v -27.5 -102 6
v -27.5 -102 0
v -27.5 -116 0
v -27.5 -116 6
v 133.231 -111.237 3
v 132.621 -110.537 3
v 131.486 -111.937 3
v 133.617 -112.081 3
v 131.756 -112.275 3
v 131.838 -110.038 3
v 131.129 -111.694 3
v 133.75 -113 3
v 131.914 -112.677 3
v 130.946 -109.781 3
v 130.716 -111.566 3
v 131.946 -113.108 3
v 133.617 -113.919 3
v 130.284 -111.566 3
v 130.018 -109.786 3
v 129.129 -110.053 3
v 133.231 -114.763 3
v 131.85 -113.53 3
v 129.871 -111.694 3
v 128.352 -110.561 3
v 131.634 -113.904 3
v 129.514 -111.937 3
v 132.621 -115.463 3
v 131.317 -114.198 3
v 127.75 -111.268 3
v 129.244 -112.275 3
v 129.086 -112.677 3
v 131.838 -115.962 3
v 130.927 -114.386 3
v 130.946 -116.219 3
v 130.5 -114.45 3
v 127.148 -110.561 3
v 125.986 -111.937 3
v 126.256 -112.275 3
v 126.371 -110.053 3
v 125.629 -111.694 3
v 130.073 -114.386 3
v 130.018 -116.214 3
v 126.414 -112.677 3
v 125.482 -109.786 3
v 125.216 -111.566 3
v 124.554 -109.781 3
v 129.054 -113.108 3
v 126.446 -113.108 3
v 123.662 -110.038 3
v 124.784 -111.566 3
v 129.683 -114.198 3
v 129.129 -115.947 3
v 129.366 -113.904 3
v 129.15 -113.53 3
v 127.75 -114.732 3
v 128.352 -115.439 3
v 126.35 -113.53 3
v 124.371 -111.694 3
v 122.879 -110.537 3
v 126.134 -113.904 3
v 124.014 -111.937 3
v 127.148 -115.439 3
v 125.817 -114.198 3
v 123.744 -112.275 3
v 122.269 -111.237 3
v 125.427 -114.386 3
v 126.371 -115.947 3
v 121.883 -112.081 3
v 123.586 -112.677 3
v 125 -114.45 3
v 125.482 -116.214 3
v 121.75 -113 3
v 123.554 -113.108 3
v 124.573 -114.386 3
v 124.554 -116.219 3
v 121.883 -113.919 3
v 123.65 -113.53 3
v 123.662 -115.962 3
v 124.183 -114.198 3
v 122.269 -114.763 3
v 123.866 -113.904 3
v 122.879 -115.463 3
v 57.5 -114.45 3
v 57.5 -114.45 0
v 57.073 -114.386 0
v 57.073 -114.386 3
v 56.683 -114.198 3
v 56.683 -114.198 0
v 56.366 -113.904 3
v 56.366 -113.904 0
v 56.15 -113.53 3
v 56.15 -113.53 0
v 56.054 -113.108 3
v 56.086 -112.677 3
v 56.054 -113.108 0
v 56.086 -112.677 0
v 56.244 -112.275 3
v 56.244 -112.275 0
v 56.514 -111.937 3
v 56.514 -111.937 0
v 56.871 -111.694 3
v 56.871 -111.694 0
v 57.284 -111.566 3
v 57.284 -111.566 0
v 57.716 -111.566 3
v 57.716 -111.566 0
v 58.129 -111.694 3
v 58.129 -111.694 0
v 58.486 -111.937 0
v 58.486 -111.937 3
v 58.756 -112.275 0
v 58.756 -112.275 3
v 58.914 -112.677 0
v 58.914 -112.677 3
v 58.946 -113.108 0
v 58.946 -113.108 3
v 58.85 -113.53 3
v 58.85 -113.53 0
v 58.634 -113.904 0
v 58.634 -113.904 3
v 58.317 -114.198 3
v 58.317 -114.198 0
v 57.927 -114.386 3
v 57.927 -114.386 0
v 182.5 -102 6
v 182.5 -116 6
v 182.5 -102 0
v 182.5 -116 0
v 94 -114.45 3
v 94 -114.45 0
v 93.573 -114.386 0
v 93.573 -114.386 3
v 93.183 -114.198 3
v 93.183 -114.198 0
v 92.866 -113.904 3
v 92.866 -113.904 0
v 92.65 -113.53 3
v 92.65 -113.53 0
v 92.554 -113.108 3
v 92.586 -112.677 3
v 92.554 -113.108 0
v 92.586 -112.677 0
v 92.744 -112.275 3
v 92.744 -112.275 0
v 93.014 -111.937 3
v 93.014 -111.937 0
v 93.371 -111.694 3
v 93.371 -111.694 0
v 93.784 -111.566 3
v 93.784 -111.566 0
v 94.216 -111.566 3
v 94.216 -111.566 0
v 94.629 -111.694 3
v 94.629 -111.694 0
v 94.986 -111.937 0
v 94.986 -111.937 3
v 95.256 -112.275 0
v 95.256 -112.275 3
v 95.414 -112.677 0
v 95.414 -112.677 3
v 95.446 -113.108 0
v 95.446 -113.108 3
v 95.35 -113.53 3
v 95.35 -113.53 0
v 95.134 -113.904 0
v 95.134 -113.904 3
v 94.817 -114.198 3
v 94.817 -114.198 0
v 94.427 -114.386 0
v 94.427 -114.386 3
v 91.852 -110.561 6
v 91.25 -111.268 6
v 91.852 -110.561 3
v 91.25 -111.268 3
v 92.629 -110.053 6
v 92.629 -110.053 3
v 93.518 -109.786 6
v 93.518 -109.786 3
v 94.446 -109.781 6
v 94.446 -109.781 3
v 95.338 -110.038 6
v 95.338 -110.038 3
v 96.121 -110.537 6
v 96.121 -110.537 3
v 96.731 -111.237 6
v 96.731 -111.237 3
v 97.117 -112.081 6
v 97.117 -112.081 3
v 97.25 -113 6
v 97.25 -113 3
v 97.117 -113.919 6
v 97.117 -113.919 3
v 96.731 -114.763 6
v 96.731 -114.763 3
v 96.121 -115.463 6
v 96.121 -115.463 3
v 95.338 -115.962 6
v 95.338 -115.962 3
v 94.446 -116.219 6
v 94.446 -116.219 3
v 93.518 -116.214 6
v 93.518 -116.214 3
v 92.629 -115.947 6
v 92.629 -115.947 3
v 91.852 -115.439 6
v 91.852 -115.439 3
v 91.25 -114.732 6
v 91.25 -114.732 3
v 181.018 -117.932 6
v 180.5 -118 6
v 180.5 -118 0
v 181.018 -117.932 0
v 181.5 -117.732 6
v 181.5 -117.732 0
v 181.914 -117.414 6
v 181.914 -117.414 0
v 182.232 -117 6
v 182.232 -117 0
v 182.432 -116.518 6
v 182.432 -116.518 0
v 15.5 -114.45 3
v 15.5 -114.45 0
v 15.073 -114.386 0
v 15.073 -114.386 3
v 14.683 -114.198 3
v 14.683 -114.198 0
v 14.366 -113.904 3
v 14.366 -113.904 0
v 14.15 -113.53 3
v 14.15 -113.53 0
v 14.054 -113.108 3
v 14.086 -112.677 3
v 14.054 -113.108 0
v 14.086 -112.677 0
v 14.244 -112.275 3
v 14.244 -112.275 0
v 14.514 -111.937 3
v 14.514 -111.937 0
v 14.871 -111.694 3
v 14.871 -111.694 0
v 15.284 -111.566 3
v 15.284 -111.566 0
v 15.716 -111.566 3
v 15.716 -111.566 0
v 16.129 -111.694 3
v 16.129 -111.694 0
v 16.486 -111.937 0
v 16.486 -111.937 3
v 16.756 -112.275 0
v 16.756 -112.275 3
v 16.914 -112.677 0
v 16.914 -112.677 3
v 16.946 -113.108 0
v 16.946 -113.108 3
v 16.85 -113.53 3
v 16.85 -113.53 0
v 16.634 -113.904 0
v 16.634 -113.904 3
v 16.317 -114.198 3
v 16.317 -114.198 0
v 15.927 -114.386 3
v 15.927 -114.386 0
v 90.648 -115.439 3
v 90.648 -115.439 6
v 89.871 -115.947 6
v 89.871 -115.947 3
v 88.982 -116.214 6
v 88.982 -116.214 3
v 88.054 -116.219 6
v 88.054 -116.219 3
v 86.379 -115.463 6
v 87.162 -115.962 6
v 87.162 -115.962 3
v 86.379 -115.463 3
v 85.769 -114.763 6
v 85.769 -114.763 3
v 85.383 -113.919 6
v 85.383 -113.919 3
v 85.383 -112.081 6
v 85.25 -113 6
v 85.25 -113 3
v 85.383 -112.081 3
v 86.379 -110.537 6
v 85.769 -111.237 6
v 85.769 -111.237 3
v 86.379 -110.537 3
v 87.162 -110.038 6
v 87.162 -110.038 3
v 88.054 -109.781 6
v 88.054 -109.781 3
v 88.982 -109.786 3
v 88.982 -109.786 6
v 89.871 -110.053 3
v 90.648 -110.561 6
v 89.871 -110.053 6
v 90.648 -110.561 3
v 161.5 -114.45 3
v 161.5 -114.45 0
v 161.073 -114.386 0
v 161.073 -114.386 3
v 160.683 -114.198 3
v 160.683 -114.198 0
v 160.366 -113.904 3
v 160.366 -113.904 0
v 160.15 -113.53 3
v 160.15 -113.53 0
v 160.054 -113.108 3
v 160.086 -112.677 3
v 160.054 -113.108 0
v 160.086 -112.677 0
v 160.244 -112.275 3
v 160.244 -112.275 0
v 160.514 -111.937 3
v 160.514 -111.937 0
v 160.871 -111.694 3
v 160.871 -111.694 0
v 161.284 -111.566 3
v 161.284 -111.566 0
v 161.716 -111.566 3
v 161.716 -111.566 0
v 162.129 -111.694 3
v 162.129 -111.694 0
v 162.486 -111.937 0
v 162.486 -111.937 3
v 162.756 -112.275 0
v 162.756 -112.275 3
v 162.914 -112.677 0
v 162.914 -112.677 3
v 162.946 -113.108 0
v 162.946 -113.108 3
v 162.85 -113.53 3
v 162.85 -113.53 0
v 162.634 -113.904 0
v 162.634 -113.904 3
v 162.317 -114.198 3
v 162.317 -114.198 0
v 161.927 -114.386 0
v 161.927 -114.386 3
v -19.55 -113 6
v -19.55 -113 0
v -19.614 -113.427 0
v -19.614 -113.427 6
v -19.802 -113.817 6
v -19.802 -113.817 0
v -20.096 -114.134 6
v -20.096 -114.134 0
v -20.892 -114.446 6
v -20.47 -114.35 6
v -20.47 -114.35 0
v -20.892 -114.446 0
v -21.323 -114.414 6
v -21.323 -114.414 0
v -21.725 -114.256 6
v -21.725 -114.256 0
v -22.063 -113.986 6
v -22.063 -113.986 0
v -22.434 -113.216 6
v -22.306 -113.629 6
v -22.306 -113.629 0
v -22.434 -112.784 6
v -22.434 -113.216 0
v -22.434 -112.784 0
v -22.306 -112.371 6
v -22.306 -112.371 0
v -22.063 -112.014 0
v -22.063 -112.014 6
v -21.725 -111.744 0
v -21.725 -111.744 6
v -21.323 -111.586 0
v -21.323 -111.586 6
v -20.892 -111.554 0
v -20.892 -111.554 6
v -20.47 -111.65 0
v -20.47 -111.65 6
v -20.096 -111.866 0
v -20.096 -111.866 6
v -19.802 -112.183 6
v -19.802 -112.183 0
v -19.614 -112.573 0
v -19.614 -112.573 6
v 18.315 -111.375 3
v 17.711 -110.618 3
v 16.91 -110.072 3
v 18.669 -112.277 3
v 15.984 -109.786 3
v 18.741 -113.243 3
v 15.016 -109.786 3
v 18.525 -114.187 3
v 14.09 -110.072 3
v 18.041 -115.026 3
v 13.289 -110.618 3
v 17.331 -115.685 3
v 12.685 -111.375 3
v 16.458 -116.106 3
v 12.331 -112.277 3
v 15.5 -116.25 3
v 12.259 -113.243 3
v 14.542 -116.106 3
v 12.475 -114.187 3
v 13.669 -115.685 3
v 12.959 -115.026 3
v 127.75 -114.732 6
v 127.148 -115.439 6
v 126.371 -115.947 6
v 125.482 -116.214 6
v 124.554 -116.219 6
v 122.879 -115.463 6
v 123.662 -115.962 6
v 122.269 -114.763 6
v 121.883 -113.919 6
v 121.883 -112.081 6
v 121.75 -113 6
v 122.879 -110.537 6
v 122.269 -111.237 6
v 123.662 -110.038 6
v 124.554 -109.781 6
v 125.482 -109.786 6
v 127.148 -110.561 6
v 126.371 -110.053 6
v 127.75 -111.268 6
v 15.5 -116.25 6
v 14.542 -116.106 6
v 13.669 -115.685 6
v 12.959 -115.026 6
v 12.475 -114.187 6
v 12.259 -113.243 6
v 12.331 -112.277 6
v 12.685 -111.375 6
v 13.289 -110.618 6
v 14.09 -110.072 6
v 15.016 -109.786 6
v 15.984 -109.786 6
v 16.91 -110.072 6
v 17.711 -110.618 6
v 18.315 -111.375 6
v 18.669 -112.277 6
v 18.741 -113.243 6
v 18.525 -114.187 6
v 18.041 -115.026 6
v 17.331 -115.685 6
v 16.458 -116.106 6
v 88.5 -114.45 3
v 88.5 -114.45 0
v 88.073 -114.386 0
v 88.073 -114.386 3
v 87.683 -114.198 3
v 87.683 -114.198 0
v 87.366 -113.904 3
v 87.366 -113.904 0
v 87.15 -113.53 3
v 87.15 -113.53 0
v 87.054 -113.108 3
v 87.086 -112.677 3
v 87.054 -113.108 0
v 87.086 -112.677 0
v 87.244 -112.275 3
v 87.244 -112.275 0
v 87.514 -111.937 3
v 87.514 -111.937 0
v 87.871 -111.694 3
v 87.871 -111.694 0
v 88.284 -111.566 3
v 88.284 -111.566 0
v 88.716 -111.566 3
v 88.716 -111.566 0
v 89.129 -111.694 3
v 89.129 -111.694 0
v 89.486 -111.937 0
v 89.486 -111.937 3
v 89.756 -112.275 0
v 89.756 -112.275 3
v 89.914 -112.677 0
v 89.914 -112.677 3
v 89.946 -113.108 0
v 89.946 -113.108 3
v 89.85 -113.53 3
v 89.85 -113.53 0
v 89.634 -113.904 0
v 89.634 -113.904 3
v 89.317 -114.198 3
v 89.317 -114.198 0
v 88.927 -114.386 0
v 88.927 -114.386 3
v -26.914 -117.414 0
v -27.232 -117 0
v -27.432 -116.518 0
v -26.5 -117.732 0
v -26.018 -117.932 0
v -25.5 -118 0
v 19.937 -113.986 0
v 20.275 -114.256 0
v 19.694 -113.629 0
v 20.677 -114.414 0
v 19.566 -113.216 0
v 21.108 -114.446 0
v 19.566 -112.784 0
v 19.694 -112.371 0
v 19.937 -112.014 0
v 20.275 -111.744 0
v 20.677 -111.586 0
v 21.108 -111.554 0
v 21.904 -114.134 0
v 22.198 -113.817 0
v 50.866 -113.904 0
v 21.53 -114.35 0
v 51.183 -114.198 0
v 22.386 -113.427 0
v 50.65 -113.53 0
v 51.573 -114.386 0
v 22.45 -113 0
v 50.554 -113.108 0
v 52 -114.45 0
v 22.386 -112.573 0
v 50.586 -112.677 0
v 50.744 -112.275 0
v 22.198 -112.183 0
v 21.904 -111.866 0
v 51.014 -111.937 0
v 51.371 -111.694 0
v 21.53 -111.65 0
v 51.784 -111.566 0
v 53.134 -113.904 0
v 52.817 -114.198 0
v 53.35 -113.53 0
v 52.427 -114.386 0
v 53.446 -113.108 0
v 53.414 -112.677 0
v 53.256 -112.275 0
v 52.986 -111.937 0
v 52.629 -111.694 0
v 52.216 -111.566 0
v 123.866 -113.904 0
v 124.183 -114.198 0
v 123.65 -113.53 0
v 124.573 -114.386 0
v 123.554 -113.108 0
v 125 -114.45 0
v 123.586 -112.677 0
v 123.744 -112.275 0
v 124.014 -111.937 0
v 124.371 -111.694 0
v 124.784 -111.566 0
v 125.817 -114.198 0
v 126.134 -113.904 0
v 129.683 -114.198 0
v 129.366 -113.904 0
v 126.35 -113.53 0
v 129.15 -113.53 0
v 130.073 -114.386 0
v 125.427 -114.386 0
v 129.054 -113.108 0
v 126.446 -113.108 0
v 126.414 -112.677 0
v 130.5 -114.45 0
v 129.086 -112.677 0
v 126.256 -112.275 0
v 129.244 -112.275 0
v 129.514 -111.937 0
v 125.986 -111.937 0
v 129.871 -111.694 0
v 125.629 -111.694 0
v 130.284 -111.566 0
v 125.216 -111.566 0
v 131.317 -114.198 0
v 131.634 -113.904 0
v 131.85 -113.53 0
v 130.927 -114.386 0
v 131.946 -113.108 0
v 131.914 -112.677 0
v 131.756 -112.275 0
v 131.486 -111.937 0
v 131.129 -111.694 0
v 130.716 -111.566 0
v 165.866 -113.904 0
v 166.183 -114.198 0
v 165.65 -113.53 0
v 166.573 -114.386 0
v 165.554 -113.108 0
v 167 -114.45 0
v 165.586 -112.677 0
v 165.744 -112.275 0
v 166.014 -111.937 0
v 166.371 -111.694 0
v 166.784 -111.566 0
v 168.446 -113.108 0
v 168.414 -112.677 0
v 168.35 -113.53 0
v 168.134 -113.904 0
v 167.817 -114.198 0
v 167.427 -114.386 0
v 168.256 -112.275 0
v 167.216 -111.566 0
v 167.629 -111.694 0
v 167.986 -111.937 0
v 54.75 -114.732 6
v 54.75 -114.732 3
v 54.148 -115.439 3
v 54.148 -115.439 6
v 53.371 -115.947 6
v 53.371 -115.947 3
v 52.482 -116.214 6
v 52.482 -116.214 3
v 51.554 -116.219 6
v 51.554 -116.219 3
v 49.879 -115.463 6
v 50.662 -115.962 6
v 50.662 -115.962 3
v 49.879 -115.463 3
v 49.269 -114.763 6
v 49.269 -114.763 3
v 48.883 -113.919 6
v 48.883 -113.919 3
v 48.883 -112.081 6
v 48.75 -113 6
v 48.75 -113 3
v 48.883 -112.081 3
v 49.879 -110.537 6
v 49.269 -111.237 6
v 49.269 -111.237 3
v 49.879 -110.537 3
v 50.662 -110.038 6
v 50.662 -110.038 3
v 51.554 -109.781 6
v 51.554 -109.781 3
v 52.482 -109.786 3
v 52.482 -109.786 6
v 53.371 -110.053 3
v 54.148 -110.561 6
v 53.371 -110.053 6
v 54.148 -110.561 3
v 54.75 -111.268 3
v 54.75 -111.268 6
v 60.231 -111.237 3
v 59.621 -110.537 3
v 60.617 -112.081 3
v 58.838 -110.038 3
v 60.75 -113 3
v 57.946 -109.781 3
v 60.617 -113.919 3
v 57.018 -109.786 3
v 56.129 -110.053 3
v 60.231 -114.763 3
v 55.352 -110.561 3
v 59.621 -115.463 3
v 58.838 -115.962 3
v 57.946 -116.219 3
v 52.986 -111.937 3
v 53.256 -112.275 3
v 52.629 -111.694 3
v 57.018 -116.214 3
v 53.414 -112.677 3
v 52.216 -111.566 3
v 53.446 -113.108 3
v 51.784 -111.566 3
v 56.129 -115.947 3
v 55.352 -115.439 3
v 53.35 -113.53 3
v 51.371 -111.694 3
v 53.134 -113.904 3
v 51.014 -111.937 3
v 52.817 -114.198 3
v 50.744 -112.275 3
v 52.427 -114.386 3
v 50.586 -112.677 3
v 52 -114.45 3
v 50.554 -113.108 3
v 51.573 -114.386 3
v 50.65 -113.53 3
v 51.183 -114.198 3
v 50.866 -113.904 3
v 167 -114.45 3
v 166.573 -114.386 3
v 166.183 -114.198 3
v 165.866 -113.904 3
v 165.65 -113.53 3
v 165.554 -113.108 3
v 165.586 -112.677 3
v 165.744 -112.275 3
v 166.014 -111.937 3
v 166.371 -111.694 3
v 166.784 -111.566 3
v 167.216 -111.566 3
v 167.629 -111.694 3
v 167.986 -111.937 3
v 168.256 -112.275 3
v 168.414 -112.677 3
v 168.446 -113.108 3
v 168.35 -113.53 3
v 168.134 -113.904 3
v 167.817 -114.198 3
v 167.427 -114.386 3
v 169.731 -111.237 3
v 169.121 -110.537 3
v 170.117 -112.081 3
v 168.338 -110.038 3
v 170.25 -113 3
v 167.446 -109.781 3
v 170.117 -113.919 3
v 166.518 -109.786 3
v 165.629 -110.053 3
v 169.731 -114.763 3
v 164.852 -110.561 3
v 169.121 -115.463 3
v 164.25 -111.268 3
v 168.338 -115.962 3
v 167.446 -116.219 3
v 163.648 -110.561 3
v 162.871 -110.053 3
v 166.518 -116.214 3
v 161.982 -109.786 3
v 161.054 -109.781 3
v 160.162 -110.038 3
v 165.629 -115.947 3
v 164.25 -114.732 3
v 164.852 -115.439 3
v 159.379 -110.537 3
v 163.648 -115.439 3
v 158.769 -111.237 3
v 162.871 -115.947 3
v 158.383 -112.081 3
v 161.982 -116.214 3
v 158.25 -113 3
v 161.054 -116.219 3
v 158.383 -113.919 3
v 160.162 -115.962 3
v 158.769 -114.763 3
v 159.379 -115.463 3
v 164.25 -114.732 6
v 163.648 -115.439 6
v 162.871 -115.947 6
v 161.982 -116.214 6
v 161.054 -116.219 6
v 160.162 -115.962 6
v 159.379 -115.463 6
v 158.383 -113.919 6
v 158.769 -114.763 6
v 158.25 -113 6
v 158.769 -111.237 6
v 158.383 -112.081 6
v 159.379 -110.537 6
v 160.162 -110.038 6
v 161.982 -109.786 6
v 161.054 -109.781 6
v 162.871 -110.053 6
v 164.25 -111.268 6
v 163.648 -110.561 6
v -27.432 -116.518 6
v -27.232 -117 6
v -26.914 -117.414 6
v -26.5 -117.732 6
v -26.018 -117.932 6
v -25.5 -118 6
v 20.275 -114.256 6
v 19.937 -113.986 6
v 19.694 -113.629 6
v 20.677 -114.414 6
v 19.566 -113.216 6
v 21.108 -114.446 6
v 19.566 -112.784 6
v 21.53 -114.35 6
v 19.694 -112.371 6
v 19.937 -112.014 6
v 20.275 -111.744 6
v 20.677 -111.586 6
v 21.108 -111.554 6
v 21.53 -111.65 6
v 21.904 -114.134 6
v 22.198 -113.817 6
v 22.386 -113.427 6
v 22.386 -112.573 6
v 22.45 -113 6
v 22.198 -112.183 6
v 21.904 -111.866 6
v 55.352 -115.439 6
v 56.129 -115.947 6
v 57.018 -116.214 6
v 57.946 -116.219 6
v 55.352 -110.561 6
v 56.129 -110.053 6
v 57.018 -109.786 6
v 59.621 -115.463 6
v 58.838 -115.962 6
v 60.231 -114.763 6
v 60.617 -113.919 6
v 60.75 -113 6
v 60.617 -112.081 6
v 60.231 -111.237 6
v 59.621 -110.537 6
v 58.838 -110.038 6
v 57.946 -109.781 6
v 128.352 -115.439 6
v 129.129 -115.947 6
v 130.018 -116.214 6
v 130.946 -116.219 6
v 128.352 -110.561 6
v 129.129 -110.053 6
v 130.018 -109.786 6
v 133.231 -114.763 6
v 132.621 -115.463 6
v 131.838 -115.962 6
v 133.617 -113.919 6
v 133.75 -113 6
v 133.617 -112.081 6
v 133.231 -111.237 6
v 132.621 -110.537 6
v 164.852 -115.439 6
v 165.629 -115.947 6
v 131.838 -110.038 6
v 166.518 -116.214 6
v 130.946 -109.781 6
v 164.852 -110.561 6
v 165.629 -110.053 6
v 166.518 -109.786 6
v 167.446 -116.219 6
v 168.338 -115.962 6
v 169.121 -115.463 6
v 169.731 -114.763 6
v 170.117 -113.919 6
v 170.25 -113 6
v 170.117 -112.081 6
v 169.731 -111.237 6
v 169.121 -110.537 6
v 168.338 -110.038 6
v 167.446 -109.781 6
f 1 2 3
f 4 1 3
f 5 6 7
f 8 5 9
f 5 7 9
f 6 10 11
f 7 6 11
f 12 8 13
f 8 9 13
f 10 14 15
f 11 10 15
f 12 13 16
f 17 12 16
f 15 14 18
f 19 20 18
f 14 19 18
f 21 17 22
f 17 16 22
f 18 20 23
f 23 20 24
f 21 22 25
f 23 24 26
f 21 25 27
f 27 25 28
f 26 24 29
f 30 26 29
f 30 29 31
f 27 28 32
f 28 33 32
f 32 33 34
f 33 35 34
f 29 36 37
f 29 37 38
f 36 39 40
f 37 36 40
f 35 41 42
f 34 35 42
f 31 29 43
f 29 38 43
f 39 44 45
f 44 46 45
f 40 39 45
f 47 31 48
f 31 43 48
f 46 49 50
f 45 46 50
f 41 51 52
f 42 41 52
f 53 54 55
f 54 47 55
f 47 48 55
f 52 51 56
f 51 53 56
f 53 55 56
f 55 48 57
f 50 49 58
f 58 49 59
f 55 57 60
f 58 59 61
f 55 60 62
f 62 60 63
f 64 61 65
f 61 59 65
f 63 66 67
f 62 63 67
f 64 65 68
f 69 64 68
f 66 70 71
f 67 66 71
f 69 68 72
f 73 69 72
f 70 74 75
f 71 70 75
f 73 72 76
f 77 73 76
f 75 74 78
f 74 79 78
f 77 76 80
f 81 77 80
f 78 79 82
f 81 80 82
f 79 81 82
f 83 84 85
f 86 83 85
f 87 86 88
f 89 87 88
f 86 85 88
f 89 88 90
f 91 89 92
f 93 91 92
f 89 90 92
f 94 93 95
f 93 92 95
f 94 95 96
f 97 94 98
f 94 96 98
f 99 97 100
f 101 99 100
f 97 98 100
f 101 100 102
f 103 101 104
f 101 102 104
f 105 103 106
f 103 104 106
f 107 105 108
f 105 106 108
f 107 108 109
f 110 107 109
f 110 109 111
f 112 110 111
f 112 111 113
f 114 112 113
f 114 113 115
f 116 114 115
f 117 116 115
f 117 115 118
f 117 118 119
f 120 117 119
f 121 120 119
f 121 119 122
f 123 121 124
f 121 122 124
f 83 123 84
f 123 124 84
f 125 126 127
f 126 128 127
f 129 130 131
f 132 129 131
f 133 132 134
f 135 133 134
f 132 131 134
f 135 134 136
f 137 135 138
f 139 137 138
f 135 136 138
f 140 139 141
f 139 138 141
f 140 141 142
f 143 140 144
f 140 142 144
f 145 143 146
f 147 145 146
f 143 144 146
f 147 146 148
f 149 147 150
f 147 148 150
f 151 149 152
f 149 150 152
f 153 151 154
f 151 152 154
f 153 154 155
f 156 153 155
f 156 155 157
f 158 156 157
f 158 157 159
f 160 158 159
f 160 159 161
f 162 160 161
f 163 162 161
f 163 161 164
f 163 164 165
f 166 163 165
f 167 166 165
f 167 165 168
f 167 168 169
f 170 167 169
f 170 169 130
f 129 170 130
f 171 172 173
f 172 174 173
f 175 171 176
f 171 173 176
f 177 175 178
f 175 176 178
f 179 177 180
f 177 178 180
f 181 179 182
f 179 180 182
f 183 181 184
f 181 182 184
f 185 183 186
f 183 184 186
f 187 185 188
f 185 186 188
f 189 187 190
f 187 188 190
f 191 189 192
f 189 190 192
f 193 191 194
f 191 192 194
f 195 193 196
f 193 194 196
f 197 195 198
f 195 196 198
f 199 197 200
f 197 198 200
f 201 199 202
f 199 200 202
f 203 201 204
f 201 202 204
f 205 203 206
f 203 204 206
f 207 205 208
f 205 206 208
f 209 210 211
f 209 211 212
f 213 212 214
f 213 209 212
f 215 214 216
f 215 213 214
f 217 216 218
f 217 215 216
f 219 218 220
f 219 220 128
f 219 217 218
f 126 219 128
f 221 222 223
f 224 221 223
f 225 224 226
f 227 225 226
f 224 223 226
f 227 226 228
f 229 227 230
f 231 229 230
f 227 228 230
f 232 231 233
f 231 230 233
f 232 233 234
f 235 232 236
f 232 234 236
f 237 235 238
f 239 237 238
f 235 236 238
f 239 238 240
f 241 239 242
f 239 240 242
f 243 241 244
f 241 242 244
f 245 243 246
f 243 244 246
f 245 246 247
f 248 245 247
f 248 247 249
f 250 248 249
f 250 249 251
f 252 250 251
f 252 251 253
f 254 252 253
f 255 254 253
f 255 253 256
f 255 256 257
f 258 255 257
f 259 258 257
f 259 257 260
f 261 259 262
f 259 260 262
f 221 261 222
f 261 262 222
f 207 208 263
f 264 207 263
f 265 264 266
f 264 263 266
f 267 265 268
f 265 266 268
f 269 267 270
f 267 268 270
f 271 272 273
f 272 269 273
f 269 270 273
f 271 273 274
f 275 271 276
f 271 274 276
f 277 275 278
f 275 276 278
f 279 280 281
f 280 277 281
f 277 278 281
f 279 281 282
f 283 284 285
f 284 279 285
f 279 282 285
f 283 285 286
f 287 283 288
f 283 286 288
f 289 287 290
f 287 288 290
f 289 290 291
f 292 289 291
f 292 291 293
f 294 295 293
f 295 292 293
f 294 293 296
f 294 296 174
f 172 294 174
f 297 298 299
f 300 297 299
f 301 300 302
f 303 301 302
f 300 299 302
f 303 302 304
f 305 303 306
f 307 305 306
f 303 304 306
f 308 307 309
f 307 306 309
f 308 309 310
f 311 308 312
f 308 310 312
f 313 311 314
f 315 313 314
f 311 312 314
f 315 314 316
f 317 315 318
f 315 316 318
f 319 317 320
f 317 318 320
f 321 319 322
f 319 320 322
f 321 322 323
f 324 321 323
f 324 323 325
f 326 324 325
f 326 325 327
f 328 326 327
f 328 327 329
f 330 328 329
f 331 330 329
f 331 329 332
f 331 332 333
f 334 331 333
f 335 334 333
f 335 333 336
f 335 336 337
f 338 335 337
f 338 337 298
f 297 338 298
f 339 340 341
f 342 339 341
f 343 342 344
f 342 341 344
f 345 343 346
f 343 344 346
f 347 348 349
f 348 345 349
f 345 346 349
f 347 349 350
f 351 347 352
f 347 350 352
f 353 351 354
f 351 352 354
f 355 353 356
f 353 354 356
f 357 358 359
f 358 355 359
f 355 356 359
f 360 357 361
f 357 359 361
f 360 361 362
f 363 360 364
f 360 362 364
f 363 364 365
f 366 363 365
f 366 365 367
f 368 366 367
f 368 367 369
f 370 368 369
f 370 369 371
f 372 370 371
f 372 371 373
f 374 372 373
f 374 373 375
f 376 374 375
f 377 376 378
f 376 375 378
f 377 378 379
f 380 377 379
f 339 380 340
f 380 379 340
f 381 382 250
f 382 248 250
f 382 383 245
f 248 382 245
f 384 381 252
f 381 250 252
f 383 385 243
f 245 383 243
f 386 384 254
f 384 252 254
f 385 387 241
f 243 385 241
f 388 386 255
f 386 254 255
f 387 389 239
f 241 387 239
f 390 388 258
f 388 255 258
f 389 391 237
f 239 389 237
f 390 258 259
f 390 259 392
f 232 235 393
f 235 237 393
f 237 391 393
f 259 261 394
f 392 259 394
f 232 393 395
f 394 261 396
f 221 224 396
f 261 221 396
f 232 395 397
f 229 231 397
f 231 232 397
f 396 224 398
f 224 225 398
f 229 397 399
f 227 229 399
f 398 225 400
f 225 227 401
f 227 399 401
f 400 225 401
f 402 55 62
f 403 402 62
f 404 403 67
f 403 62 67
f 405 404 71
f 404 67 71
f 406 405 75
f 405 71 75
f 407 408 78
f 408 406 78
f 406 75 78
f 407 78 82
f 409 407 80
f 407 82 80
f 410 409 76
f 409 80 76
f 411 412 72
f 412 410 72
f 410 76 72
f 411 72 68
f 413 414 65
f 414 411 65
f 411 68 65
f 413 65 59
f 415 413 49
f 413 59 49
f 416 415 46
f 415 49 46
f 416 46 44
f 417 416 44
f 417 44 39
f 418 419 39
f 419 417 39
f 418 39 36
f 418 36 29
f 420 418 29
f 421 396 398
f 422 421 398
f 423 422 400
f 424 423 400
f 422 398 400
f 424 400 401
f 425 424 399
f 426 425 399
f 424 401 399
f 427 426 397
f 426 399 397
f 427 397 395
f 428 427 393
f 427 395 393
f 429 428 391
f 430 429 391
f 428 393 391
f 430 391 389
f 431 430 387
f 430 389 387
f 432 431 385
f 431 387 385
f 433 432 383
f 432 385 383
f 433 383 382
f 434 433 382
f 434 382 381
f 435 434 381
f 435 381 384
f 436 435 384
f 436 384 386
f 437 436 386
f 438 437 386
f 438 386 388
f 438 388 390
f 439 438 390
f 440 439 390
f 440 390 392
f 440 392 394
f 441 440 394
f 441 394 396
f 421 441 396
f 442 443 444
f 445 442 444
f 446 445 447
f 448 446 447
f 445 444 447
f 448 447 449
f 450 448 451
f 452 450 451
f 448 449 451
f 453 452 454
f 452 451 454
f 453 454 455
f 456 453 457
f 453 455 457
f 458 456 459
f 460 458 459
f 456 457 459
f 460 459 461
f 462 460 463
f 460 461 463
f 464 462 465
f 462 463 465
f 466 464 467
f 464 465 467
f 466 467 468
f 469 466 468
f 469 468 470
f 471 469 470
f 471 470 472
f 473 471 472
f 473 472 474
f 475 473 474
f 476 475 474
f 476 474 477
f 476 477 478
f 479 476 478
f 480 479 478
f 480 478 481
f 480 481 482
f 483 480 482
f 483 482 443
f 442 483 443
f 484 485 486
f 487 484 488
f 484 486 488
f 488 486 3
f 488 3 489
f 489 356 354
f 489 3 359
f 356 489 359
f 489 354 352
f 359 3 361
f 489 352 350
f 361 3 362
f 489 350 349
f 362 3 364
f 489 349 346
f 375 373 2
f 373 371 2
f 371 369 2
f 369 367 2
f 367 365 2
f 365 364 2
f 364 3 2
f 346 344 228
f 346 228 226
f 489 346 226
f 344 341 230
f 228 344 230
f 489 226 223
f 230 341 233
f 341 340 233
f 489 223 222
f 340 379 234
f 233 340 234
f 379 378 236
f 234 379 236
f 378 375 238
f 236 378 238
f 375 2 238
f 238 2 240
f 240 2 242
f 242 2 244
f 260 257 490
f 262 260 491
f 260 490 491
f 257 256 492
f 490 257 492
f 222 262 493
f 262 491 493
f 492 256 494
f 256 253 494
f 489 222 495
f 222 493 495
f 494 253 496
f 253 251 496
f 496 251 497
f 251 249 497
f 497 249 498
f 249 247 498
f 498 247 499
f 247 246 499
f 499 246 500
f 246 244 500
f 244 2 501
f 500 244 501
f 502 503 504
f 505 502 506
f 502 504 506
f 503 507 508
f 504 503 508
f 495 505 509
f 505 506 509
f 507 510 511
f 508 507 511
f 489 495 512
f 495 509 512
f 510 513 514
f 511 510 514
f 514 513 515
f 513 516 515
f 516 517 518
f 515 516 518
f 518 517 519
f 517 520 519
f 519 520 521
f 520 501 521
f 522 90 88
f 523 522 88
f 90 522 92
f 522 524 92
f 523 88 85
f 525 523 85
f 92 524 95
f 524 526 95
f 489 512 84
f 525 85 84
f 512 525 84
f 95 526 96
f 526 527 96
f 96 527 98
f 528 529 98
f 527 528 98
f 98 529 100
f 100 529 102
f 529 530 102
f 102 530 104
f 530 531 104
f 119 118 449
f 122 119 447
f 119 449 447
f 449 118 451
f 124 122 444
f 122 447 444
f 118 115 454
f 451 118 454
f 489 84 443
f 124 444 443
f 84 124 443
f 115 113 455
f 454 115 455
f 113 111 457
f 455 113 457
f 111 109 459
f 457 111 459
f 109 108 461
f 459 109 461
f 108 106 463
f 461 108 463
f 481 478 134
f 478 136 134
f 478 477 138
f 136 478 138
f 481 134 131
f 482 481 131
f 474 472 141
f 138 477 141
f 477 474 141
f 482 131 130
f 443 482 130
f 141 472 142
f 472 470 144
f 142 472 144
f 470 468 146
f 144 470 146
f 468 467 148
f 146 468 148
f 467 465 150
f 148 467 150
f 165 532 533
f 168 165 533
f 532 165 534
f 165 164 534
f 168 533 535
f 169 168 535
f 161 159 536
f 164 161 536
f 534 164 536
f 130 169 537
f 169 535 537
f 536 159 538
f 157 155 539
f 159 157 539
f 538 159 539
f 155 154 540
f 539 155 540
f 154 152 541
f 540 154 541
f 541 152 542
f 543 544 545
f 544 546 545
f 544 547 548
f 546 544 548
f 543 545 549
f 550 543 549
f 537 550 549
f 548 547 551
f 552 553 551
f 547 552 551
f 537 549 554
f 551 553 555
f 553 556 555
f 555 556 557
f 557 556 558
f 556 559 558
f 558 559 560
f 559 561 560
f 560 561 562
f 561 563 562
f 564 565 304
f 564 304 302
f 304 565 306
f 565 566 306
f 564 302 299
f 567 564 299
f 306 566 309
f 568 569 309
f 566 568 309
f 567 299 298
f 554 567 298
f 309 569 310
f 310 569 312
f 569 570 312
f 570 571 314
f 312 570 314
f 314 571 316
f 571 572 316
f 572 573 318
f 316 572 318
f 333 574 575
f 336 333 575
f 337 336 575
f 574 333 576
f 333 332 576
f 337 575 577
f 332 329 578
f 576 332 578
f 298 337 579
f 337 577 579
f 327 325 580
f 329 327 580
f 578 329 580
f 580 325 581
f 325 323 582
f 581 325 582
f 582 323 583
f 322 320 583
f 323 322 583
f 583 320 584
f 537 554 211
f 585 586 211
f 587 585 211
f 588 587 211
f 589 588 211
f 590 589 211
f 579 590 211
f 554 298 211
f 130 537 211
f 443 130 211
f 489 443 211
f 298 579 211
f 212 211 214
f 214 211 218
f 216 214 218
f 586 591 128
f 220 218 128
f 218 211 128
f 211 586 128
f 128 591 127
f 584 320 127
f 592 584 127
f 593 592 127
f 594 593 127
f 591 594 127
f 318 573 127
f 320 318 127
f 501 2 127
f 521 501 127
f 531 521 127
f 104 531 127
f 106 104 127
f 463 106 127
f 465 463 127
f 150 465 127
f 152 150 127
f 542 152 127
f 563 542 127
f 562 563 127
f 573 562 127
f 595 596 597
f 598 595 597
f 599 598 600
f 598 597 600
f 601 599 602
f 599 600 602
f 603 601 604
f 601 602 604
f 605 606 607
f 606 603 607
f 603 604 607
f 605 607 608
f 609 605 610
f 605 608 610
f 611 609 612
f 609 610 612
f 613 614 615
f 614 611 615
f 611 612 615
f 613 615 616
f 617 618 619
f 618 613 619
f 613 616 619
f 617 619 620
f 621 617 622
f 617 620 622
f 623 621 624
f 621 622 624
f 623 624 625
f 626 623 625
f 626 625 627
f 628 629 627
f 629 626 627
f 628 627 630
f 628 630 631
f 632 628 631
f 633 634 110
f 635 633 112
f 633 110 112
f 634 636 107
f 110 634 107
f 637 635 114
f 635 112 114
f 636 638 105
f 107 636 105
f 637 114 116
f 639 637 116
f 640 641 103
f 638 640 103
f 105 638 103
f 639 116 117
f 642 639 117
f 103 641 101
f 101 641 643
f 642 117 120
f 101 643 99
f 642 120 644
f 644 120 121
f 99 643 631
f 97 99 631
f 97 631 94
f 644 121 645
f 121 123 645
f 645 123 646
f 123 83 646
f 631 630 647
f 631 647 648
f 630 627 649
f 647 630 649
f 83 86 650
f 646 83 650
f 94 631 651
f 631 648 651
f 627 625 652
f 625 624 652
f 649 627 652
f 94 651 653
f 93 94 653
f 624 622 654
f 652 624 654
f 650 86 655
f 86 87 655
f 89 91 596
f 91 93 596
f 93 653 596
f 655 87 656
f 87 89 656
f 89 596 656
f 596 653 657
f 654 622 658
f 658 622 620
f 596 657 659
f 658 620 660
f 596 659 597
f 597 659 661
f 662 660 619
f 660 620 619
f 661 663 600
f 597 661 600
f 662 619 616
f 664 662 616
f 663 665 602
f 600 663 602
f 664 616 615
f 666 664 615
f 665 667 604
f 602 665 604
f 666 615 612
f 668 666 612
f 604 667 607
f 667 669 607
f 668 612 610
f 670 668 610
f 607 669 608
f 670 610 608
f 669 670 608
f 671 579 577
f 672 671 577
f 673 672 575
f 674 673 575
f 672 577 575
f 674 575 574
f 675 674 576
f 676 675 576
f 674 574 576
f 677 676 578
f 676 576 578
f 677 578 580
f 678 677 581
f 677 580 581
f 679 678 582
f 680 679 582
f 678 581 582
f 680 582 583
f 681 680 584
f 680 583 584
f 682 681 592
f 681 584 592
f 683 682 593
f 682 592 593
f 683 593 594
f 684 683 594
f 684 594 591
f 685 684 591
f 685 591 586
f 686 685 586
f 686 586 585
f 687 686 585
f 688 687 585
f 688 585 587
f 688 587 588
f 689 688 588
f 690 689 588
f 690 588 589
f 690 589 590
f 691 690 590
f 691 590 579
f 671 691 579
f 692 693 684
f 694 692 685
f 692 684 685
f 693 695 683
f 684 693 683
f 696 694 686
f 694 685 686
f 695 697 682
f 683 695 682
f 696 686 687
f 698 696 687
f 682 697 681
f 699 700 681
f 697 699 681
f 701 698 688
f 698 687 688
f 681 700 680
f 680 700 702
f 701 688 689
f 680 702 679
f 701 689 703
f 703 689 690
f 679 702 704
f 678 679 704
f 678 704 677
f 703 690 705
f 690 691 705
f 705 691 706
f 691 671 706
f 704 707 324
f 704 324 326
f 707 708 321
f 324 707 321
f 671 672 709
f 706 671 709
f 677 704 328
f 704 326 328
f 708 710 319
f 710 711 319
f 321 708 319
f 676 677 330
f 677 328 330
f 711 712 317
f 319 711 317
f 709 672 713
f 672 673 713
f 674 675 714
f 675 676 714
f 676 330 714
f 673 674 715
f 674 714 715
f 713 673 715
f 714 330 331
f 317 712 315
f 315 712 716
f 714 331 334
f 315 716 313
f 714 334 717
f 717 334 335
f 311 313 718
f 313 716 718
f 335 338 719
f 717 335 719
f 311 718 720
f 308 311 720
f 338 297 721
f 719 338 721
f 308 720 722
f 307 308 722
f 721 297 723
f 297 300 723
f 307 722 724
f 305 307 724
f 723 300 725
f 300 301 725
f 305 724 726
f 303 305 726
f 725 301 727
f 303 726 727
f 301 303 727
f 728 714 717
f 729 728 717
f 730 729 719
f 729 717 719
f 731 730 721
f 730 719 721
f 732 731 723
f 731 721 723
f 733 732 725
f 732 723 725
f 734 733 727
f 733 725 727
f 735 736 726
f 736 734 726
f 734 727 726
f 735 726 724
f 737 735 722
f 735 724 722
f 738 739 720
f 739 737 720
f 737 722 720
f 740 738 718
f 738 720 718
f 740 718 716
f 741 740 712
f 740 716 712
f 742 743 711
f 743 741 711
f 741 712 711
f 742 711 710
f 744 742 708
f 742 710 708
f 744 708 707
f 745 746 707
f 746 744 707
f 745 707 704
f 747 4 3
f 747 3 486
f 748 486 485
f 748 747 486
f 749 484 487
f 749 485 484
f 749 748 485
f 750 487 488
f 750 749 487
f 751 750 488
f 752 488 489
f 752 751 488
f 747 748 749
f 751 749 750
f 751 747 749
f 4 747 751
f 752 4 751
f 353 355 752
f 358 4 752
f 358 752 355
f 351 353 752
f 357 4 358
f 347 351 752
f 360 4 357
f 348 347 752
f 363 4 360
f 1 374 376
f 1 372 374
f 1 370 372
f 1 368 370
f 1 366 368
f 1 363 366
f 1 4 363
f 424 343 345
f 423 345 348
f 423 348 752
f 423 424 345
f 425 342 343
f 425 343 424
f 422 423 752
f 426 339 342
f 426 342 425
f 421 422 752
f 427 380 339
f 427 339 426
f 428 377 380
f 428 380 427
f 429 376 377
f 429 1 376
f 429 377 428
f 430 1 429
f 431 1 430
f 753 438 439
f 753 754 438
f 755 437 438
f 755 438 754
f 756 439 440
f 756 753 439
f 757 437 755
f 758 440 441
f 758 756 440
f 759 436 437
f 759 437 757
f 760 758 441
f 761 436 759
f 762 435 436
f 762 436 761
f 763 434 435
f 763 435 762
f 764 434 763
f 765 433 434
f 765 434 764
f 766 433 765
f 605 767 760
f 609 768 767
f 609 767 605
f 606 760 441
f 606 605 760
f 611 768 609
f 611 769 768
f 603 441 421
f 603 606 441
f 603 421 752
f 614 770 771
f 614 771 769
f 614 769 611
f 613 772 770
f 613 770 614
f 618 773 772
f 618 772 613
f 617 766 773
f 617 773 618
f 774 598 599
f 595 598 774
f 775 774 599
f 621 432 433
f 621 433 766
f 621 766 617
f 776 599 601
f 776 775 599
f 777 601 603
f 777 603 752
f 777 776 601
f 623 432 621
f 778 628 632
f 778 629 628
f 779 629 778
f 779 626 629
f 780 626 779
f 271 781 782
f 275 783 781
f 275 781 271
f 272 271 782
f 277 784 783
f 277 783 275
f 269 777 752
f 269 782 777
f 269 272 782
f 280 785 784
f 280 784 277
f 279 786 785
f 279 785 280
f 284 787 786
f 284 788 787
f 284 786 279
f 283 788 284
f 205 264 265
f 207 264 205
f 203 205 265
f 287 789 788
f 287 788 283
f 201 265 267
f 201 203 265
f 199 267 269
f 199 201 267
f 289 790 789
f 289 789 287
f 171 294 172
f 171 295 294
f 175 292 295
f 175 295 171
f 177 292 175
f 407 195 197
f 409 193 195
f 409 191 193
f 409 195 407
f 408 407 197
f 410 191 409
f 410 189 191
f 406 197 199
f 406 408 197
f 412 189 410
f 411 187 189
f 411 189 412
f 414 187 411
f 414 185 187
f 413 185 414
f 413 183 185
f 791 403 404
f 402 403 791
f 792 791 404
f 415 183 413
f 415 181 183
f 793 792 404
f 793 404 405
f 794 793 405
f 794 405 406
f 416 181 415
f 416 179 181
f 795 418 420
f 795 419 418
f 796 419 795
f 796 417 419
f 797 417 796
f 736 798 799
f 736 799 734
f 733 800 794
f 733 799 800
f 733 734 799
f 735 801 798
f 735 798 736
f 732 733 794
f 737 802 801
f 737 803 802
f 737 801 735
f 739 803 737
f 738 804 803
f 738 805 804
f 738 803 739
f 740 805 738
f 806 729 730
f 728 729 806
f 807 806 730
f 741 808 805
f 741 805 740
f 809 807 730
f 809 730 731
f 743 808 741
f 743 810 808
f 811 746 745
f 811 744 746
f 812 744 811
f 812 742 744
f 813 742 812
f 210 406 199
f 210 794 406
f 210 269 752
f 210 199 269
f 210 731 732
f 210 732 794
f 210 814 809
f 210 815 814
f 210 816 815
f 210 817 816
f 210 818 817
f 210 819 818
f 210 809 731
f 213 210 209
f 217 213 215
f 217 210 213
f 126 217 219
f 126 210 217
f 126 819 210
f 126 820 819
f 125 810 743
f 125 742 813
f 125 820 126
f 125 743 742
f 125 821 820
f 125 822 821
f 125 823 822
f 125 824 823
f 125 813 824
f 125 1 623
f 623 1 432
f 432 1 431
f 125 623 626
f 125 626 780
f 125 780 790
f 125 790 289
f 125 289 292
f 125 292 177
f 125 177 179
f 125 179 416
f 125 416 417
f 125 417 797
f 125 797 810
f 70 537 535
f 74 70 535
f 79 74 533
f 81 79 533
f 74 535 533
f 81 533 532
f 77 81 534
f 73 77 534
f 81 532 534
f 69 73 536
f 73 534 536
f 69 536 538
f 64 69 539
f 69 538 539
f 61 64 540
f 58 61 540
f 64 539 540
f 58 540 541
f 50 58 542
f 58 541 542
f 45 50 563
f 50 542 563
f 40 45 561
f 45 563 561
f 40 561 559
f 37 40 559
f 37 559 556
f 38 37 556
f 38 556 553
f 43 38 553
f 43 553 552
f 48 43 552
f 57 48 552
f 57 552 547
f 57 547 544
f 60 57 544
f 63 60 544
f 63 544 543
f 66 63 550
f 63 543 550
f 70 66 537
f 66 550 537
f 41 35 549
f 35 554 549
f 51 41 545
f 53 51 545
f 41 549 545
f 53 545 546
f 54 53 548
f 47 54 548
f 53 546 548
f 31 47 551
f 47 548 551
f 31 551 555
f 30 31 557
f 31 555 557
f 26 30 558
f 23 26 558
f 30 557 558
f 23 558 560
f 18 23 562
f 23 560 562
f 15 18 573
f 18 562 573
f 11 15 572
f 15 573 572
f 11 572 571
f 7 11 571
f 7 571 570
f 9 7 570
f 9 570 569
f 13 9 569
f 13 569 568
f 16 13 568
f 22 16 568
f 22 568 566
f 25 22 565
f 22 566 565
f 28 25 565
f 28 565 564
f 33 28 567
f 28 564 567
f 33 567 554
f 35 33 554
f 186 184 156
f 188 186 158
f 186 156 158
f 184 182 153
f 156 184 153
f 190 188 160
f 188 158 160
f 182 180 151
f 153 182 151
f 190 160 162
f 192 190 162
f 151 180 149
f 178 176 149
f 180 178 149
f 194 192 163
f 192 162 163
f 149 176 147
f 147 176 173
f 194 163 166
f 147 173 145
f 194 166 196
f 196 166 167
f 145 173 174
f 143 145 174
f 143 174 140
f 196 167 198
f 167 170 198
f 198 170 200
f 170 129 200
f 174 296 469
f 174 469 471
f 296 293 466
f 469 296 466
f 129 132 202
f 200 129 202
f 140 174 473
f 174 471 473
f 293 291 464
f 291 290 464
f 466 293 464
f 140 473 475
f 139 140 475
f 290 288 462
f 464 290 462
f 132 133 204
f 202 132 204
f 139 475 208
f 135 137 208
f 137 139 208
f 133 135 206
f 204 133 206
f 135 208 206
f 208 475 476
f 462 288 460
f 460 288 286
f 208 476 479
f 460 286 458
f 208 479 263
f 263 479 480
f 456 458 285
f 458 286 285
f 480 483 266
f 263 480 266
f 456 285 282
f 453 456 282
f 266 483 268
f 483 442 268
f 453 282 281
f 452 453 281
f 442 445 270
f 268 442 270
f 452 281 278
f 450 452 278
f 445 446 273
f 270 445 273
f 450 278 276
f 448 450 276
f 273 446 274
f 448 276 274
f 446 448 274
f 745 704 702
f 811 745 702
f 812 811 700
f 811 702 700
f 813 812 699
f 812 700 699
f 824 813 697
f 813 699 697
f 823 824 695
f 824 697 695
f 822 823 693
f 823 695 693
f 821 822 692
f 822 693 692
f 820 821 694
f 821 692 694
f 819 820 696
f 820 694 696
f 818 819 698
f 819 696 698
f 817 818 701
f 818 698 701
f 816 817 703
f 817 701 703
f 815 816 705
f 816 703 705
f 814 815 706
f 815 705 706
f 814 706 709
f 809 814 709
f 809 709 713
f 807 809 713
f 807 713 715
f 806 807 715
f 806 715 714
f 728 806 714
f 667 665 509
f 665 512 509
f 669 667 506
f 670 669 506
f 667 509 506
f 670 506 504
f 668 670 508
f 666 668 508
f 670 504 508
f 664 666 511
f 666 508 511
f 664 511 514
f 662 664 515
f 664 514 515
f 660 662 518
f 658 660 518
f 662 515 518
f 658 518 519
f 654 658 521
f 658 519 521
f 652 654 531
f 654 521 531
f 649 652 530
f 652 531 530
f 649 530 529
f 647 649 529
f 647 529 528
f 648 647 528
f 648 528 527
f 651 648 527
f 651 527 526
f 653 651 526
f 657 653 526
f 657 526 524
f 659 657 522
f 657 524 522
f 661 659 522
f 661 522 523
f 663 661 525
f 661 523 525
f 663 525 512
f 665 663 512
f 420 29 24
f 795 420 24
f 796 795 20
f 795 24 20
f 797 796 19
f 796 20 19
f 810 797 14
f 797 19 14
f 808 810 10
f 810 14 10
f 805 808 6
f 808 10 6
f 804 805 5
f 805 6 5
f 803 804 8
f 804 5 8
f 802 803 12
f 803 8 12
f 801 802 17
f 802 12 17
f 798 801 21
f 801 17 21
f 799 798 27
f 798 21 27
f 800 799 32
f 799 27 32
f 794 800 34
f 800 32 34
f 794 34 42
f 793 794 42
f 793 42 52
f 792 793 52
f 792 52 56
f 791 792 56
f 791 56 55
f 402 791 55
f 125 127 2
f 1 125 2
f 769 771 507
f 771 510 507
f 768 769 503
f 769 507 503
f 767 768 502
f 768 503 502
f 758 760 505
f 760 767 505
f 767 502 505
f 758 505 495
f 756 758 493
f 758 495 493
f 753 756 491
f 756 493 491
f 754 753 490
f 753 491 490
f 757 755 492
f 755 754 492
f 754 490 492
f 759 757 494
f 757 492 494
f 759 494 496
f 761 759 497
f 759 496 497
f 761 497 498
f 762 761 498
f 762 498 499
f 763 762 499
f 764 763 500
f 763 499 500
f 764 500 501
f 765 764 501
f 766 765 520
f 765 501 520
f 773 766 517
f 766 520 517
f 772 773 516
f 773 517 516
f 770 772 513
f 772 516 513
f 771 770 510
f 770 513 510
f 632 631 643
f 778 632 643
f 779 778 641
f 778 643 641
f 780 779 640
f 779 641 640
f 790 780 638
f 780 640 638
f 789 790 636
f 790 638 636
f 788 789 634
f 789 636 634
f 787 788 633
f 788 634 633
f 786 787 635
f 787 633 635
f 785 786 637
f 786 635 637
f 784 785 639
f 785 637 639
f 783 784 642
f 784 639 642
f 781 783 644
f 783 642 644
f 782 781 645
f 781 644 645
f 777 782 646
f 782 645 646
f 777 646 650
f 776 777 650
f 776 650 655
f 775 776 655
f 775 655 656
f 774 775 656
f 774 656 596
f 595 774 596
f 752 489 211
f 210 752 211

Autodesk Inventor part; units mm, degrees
ref_plane "YZ Plane" through (0, 0, 0) normal (1, 0, 0) x (0, 1, 0)
ref_plane "XZ Plane" through (0, 0, 0) normal (0, 1, 0) x (-1, 0, 0)
ref_plane "XY Plane" through (0, 0, 0) normal (0, 0, 1) x (1, 0, 0)
ref_plane "Work Plane1" through (0, 0, 0) normal (0, 0, 1) x (1, 0, 0)
sketch "Sketch1" plane through (0, 0, 0) normal (0, 0, 1) x (1, 0, 0)
  circle A0 centre (-21, 106) radius 1.45 projected
  circle A1 centre (-21, 69.5) radius 1.45 projected
  circle A2 centre (-21, 33) radius 1.45 projected
  circle A3 centre (-21, -3.5) radius 1.45 projected
  circle A4 centre (-21, -40) radius 1.45 projected
  circle A5 centre (-21, -113) radius 1.45 projected
  circle A6 centre (21, -113) radius 1.45 projected
  circle A7 centre (21, -40) radius 1.45 projected
  circle A8 centre (21, -3.5) radius 1.45 projected
  circle A9 centre (21, 33) radius 1.45 projected
  circle A10 centre (21, 69.5) radius 1.45 projected
  circle A11 centre (21, 106) radius 1.45 projected
  arc A12 (-6.5, 102) -> (-11.5, 97) centre (-6.5, 97) ccw projected
  line L0 (-6.5, 102) -> (6.5, 102) projected
  arc A13 (11.5, 97) -> (6.5, 102) centre (6.5, 97) ccw projected
  line L1 (11.5, 97) -> (11.5, -97) projected
  arc A14 (6.5, -102) -> (11.5, -97) centre (6.5, -97) ccw projected
  line L2 (6.5, -102) -> (-6.5, -102) projected
  arc A15 (-11.5, -97) -> (-6.5, -102) centre (-6.5, -97) ccw projected
  line L3 (-11.5, -97) -> (-11.5, 97) projected
  arc A16 (25.5, -118) -> (27.5, -116) centre (25.5, -116) ccw projected
  line L4 (27.5, -116) -> (27.5, 116) projected
  arc A17 (27.5, 116) -> (25.5, 118) centre (25.5, 116) ccw projected
  line L5 (25.5, 118) -> (-25.5, 118) projected
  arc A18 (-25.5, 118) -> (-27.5, 116) centre (-25.5, 116) ccw projected
  line L6 (-27.5, 116) -> (-27.5, -116) projected
  arc A19 (-27.5, -116) -> (-25.5, -118) centre (-25.5, -116) ccw projected
  line L7 (-25.5, -118) -> (25.5, -118) projected
  circle A20 centre (21, -76.5) radius 1.45 projected
  circle A21 centre (-21, -76.5) radius 1.45 projected
  circle A22 centre (21, 111.5) radius 1.45 projected
  circle A23 centre (-21, 111.5) radius 1.45 projected
  arc A24 (48.8107, 3.6492) -> (48.6958, 3.3718) centre (50.5958, 2.7473) ccw construction
  line L8 (48.6958, -66.1718) -> (48.6958, 3.3718) construction
  arc A25 (48.6958, -66.1718) -> (48.8107, -66.4492) centre (50.5958, -65.5473) ccw construction
  line L9 (54.3466, -71.9851) -> (48.8107, -66.4492) construction
  arc A26 (54.3466, -71.9851) -> (54.624, -72.1) centre (55.2485, -70.2) ccw construction
  line L10 (170.6958, -72.1) -> (54.624, -72.1) construction
  arc A27 (170.6958, -72.1) -> (172.2958, -70.5) centre (170.6958, -70.5) ccw construction
  line L11 (172.2958, 7.7) -> (172.2958, -70.5) construction
  arc A28 (172.2958, 7.7) -> (170.6958, 9.3) centre (170.6958, 7.7) ccw construction
  line L12 (54.624, 9.3) -> (170.6958, 9.3) construction
  arc A29 (54.624, 9.3) -> (54.3466, 9.1851) centre (55.2485, 7.4) ccw construction
  line L13 (48.8107, 3.6492) -> (54.3466, 9.1851) construction
  line L14 (56.1958, 4.9) -> (164.7958, 4.9) construction
  line L15 (164.7958, 4.9) -> (164.7958, -67.7) construction
  line L16 (164.7958, -67.7) -> (56.1958, -67.7) construction
  line L17 (56.1958, -67.7) -> (56.1958, 4.9) construction
  line L18 (174.3958, -70.2) -> (174.3958, 7.4) construction
  arc A30 (50.5958, 11.1) -> (46.8958, 7.4) centre (50.5958, 7.4) ccw construction
  arc A31 (46.6958, -70.2) -> (50.5958, -74.1) centre (50.5958, -70.2) ccw construction
  arc A32 (174.2958, 7.4) -> (170.3958, 11.3) centre (170.3958, 7.4) ccw construction
  arc A33 (170.3958, -74.1) -> (174.2958, -70.2) centre (170.3958, -70.2) ccw construction
  line L19 (-27.5, -118) -> (182.5, -118)
  line L20 (182.5, -118) -> (182.5, -102)
  line L21 (182.5, -102) -> (-27.5, -102)
  line L22 (-27.5, -102) -> (-27.5, -118)
  circle A34 centre (21, -113) radius 1.45 construction
  circle A35 centre (-21, -113) radius 1.45 construction
  line L23 (27.5, -102) -> (11.5, -102)
  line L24 (11.5, -102) -> (11.5, -70)
  line L25 (11.5, -70) -> (27.5, -70)
  line L26 (27.5, -70) -> (27.5, -102)
  line L27 (-27.5, -102) -> (-11.5, -102)
  line L28 (-11.5, -102) -> (-11.5, -70)
  line L29 (-11.5, -70) -> (-27.5, -70)
  line L30 (-27.5, -70) -> (-27.5, -102)
  circle A36 centre (21, -76.5) radius 1.45 projected
  circle A37 centre (-21, -76.5) radius 1.45 projected
  circle A38 centre (21, -113) radius 1.45 projected
  circle A39 centre (-21, -113) radius 1.45 projected
  circle A40 centre (21, -113) radius 1.45
  circle A41 centre (-21, -113) radius 1.45
  circle A42 centre (15.5, -113) radius 1.45
  circle A43 centre (57.5, -113) radius 1.45
  circle A44 centre (52, -113) radius 1.45
  circle A45 centre (94, -113) radius 1.45
  circle A46 centre (88.5, -113) radius 1.45
  circle A47 centre (130.5, -113) radius 1.45
  circle A48 centre (125, -113) radius 1.45
  circle A49 centre (167, -113) radius 1.45
  circle A50 centre (161.5, -113) radius 1.45
  circle A51 centre (203.5, -113) radius 1.45
  circle A52 centre (198, -113) radius 1.45
  circle A53 centre (240, -113) radius 1.45
  circle A54 centre (234.5, -113) radius 1.45
  circle A55 centre (276.5, -113) radius 1.45
  circle A56 centre (271, -113) radius 1.45
  circle A57 centre (313, -113) radius 1.45
  circle A58 centre (307.5, -113) radius 1.45
  circle A59 centre (349.5, -113) radius 1.45
  point P0 (0, 0)
  dimension "d1" = 210
  dimension "d2" = 32
  dimension "d8" = 36.5
extrude "Extrusion1" add sketch "Sketch1" along normal blind 6 contours L2 L21 L4 A16 L7 A19 L6 | A19 L19 L22 | L21 L20 L19 A16 L4 | A42 | A43 | A44 | A45 | A46 | A47 | A48 | A49 | A50
fillet "Fillet1" radius 2 2 edges at (-27.5, -118, 3) (182.5, -118, 3)
sketch "Sketch2" plane through (0, 0, 6) normal (0, 0, 1) x (1, 0, 0)
  arc A0 (180.5, -118) -> (182.5, -116) centre (180.5, -116) ccw projected
  line L0 (182.5, -116) -> (182.5, -102) projected
  line L1 (182.5, -102) -> (-27.5, -102) projected
  line L2 (-27.5, -102) -> (-27.5, -116) projected
  arc A1 (-27.5, -116) -> (-25.5, -118) centre (-25.5, -116) ccw projected
  line L3 (-25.5, -118) -> (180.5, -118) projected
  line L4 (-25.1, -118) -> (-25.1, -108)
  point P0 (0, 0)
  point P1 (57.5, -113)
  point P2 (15.5, -113)
  point P3 (94, -113)
  point P4 (52, -113)
  point P5 (130.5, -113)
  point P6 (88.5, -113)
  point P7 (167, -113)
  point P8 (125, -113)
  point P9 (203.5, -113)
  point P10 (161.5, -113)
  point P11 (240, -113)
  point P12 (198, -113)
  point P13 (276.5, -113)
  point P14 (234.5, -113)
  point P15 (313, -113)
  point P16 (271, -113)
  point P17 (349.5, -113)
  point P18 (307.5, -113)
  dimension "d15" = 36.5
hole "Hole1" at (15.5, -113, 6) at (52, -113, 6) at (57.5, -113, 6) at (88.5, -113, 6) at (94, -113, 6) at (125, -113, 6) at (130.5, -113, 6) at (161.5, -113, 6) at (167, -113, 6) direction (0, 0, -1) diameter 2.9 end through all counterbore diameter 6.5 counterbore depth 3
properties part number "03_Opentrons_Microscope_MTP_stand"
